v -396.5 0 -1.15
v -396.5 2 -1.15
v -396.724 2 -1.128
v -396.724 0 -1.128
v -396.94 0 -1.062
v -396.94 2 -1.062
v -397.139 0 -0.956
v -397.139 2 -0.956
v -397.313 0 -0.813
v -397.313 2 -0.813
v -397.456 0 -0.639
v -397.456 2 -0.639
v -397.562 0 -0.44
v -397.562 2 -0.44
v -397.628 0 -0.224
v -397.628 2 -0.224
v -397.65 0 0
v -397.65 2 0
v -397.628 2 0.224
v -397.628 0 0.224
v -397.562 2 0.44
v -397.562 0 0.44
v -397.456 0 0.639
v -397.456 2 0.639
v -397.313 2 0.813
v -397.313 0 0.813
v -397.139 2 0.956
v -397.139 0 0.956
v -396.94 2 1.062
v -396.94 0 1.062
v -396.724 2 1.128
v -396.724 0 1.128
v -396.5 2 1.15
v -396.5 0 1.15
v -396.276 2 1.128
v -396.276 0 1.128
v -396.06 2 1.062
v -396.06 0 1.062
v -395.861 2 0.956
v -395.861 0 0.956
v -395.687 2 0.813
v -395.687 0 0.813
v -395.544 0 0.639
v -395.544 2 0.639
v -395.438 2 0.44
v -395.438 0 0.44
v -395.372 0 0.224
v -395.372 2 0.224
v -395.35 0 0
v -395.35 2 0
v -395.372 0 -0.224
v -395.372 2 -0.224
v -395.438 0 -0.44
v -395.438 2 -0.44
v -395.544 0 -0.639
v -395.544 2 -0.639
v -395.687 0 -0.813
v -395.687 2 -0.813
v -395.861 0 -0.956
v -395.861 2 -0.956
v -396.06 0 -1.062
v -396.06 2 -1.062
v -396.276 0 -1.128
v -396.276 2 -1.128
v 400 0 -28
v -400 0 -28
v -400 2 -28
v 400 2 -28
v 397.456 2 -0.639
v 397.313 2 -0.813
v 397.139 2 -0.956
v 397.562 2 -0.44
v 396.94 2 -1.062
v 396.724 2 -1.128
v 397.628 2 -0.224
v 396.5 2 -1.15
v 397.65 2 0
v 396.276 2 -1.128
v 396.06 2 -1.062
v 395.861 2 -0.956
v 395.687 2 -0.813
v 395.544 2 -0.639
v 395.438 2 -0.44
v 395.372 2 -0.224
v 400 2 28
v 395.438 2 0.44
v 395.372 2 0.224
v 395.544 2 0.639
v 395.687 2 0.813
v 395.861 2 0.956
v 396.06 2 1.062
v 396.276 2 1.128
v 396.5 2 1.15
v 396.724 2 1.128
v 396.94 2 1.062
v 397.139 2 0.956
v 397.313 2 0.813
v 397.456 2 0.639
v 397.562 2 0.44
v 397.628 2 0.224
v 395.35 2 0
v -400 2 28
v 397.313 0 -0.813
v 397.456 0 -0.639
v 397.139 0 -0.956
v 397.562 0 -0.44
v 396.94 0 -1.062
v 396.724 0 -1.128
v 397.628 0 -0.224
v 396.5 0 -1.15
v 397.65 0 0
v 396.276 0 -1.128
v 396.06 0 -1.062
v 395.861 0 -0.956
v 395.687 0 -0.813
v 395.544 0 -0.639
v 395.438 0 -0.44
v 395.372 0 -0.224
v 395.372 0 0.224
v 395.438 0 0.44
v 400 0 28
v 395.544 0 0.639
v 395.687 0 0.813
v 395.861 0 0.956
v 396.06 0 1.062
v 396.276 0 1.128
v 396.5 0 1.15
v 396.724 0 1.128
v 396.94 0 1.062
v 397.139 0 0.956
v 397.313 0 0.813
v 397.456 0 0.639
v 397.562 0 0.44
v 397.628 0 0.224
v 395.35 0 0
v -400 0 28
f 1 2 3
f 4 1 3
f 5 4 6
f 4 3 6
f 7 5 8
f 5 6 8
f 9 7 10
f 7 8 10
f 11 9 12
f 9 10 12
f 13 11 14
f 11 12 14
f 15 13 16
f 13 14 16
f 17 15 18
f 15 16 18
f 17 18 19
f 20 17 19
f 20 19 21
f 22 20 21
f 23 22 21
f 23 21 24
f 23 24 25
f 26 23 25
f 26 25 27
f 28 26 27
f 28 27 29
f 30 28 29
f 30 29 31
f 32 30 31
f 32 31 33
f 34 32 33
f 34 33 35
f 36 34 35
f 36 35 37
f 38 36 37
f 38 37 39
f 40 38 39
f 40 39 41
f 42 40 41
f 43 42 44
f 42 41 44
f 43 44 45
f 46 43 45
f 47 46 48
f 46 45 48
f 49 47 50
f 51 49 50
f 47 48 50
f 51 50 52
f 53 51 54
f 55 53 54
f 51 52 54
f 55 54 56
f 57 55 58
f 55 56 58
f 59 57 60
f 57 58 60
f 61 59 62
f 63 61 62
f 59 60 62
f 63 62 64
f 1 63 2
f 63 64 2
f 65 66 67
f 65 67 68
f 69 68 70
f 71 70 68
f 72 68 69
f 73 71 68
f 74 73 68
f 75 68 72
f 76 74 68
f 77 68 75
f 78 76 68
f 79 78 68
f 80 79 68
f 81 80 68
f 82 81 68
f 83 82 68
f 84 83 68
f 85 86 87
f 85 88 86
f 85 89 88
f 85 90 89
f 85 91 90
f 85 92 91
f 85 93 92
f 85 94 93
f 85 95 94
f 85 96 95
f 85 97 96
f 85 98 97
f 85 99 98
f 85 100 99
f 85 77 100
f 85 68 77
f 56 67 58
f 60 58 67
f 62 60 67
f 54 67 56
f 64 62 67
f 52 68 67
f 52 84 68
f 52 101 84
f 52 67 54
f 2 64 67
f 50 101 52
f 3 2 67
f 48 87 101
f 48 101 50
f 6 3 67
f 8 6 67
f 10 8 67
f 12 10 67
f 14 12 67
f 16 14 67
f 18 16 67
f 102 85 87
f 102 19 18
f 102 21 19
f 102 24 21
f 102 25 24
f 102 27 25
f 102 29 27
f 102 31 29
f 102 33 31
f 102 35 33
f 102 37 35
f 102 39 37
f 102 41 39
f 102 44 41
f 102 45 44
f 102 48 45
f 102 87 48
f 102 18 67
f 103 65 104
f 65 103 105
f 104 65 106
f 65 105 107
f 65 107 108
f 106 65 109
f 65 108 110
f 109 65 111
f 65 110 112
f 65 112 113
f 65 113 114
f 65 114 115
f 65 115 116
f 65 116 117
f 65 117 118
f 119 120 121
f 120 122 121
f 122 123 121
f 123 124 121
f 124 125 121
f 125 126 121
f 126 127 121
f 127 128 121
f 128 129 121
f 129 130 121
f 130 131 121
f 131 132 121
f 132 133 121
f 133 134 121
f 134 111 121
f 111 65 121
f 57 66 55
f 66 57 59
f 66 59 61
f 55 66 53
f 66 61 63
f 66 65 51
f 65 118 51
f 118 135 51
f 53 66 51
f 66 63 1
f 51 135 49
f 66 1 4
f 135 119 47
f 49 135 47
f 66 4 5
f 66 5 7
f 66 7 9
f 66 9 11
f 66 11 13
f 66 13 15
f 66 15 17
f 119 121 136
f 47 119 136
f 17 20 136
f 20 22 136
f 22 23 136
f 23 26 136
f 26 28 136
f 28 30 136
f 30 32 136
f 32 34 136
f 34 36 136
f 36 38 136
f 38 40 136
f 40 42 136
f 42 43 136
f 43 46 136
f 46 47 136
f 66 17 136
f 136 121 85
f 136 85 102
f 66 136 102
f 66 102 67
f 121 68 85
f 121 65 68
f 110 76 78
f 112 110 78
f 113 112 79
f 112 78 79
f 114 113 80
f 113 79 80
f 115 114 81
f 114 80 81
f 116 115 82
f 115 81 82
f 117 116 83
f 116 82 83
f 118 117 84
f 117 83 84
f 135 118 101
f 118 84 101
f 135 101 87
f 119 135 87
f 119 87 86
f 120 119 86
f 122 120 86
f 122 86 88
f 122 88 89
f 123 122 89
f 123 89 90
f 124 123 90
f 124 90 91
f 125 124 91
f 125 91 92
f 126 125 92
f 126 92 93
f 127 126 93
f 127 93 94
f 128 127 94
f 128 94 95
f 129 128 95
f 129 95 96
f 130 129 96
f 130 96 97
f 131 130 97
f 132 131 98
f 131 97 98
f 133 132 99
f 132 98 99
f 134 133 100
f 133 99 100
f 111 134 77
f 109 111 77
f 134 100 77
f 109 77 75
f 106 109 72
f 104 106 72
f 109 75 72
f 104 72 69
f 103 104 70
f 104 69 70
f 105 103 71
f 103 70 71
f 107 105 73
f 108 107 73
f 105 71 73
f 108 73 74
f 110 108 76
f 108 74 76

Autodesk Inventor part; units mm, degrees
ref_plane "YZ Plane" through (0, 0, 0) normal (1, 0, 0) x (0, 1, 0)
ref_plane "XZ Plane" through (0, 0, 0) normal (0, 1, 0) x (-1, 0, 0)
ref_plane "XY Plane" through (0, 0, 0) normal (0, 0, 1) x (1, 0, 0)
sketch "Sketch2" plane through (0, 0, 0) normal (0, 1, 0) x (-1, 0, 0)
  line L0 (-400, 28) -> (400, 28)
  line L1 (400, 28) -> (400, -28)
  line L2 (400, -28) -> (-400, -28)
  line L3 (-400, -28) -> (-400, 28)
  point P0 (0, 0)
  dimension "d0" = 56
  dimension "d1" = 28
  dimension "d2" = 800
  dimension "d3" = 400
extrude "Extrusion1" add sketch "Sketch2" along normal blind 2
sketch "Sketch3" plane through (0, 0, 0) normal (0, -1, 0) x (1, 0, 0)
  circle A0 centre (-396.5, 0) radius 1.15
  line L0 (-400, 28) -> (-400, -28) projected
  point P0 (0, 0)
  dimension "d6" = 2.3
  dimension "d7" = 3.5
hole "Hole1" at (-396.5, 0, 0) direction (0, 1, 0) diameter 2.3 end through all
sketch "Sketch4" plane through (0, 0, 0) normal (0, -1, 0) x (1, 0, 0)
  circle A0 centre (396.5, 0) radius 1.15
  line L0 (400, -28) -> (400, 28) projected
  point P0 (0, 0)
  dimension "d15" = 2.3
  dimension "d16" = 3.5
hole "Hole2" at (396.5, 0, 0) direction (0, 1, 0) diameter 2.3 end through all
equation "\"d1\" = 0.5 * d0"
equation "\"d3\" = 0.5 * d2"
properties part number "rfPlateShort"
